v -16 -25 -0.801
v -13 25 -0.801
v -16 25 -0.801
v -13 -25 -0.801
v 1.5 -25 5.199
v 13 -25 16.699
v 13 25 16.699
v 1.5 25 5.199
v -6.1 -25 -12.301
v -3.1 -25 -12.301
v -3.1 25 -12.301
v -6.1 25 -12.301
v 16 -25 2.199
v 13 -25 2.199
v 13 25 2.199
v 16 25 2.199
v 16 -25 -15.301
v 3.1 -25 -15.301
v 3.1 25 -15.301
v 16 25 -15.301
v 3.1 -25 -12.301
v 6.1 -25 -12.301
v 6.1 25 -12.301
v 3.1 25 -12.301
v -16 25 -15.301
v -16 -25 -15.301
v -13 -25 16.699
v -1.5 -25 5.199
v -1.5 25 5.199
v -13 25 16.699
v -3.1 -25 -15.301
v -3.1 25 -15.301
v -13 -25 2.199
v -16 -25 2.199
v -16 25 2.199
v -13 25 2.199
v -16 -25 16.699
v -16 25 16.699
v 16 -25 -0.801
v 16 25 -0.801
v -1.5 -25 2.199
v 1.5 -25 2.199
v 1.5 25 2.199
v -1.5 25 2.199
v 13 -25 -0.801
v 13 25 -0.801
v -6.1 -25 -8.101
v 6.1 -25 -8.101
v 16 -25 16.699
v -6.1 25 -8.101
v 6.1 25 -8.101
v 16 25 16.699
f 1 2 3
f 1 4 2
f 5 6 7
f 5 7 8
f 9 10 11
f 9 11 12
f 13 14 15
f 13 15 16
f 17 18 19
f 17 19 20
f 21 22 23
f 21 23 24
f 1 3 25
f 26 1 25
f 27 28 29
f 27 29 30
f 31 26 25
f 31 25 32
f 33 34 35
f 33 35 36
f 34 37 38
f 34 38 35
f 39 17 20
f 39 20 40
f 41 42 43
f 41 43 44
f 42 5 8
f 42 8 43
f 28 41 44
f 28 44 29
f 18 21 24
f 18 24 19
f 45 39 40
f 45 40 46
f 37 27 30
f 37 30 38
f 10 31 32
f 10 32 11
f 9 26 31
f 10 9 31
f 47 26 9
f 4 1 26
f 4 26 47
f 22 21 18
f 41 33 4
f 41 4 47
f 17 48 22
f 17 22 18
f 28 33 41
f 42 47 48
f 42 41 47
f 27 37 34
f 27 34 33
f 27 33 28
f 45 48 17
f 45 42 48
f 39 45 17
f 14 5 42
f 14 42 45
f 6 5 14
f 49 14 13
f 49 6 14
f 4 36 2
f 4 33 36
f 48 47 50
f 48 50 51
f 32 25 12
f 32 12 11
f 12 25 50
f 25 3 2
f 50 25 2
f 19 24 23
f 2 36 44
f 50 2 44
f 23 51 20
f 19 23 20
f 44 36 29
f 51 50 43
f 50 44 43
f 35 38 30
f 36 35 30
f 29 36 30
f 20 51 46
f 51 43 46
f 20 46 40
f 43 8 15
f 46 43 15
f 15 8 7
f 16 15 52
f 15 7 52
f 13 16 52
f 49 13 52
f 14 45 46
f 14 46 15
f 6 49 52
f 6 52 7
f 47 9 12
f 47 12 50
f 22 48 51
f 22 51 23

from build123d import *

# Parameters (mm, degrees)
F1_DEPTH = 25


with BuildPart() as f1:
    # F0 (on Front) → F1 (new body, symmetric)
    with BuildSketch(Plane.XZ):
        Polygon((-15.9999988203, -0.8011669839), (-15.9999988203, -15.3011669839), (-3.0999990533, -15.3011669839), (-3.0999990533, -12.3011669839), (-6.0999990533, -12.3011669839), (-6.0999990533, -8.1011669839), (6.1000009467, -8.1011669839), (6.1000009467, -12.3011669839), (3.1000009467, -12.3011669839), (3.1000009467, -15.3011669839), (16.0000009467, -15.3011669839), (16.0000009467, -0.8011669839), (13.0000011797, -0.8011669839), (13.0000011797, 2.1988330161), (16.0000011797, 2.1988330161), (16.0000011797, 16.6988330161), (13.0000011797, 16.6988330161), (1.5, 5.1988330161), (1.5, 2.1988330161), (0, 2.1988330161), (-1.5, 2.1988330161), (-1.5, 5.1988330161), (-12.9999988203, 16.6988330161), (-15.9999988203, 16.6988330161), (-15.9999988203, 2.1988330161), (-12.9999988203, 2.1988330161), (-12.9999988203, -0.8011669839), align=None)
    extrude(amount=F1_DEPTH, both=True)


solid = f1.part
